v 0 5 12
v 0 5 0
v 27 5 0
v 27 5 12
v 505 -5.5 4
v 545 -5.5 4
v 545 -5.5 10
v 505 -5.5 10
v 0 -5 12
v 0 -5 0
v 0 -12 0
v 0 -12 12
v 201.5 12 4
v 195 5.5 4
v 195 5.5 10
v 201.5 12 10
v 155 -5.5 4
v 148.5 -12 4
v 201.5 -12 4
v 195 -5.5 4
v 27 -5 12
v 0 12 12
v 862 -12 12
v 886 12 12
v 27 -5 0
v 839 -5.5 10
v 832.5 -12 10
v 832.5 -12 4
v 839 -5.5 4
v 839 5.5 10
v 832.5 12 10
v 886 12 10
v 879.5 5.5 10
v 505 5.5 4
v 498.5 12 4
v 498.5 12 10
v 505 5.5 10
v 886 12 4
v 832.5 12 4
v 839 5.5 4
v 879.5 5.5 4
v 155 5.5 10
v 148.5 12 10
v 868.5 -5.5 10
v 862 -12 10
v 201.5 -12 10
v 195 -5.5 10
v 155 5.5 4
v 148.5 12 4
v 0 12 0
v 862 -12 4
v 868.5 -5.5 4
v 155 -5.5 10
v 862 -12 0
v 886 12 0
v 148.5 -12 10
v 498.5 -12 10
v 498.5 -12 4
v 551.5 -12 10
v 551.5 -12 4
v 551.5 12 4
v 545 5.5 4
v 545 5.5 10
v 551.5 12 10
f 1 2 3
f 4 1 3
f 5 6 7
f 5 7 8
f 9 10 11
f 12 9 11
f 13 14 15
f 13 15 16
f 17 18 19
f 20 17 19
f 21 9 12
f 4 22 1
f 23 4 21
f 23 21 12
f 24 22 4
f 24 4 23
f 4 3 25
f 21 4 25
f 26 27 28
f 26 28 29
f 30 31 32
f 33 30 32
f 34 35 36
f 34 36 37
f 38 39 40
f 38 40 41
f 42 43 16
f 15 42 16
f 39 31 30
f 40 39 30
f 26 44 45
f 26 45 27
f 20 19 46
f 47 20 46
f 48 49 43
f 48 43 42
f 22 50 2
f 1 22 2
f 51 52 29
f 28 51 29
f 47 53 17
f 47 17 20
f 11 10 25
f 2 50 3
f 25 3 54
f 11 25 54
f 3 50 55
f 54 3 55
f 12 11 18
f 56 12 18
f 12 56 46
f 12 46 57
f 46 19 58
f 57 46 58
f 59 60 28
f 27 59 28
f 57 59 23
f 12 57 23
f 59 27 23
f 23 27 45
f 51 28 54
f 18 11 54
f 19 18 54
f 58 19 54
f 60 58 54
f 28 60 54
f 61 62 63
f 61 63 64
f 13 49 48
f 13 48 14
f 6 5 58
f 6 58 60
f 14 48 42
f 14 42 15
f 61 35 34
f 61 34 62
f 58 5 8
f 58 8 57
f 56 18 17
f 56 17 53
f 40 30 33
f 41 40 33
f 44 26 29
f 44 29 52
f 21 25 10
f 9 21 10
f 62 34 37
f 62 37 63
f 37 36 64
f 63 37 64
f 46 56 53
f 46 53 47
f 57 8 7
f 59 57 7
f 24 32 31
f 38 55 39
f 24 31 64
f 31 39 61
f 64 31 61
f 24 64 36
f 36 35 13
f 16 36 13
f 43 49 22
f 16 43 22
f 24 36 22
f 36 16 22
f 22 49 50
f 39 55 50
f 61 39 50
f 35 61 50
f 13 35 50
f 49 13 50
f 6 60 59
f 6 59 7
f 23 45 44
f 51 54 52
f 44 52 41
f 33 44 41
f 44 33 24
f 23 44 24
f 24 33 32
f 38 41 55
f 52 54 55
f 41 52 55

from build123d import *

# Parameters (mm, degrees)
EXTRUDE_1_DEPTH        = 12
SKETCH_2_W             = 40
SKETCH_2_H             = 6
CUT_EXTRUDE_1_DEPTH    = 6.5
DRAFT_1_ANGLE          = 45
DRAFT_2_ANGLE          = 45
PATTERN_START          = 4
PATTERN_LINEAR_1_DEPTH = 6
MIRROR_START           = 4
MIRROR_2_DEPTH         = 6
CUT_EXTRUDE_START      = -2
CUT_EXTRUDE_2_DEPTH    = 6


# Read off the part's stored shape, not the designer's step: 阵列(线性)1, 镜向2
with BuildPart() as part:
    # 草图1 → 凸台-拉伸1 (new body)
    with BuildSketch(Plane.XY):
        Polygon((0, 12), (0, 5), (27, 5), (27, -5), (0, -5), (0, -12), (862, -12), (886, 12), align=None)
    extrude(amount=EXTRUDE_1_DEPTH)

    # 草图2 → 切除-拉伸1 (cut)
    with BuildSketch(Plane.XZ.offset(12)):
        with Locations((175, 7)):
            Rectangle(SKETCH_2_W, SKETCH_2_H)
    extrude(amount=-CUT_EXTRUDE_1_DEPTH, mode=Mode.SUBTRACT)

    # 拔模1
    draft_1_faces = [part.faces().sort_by_distance(p)[0] for p in [
        (155, -8.75, 7),
    ]]
    draft(draft_1_faces, Plane(origin=(0, -5.5, 0), x_dir=(0, 0, -1), z_dir=(0, -1, 0)), DRAFT_1_ANGLE)

    # 拔模2
    draft_2_faces = [part.faces().sort_by_distance(p)[0] for p in [
        (195, -8.75, 7),
    ]]
    draft(draft_2_faces, Plane(origin=(0, -5.5, 0), x_dir=(0, 0, -1), z_dir=(0, -1, 0)), DRAFT_2_ANGLE)

    # 阵列(线性)1 outline → 阵列(线性)1 (cut)
    with BuildSketch(Plane.XY.offset(PATTERN_START)):
        Polygon((551.5, -12), (545, -5.5), (505, -5.5), (498.5, -12), align=None)
    extrude(amount=PATTERN_LINEAR_1_DEPTH, mode=Mode.SUBTRACT)

    # 镜向2 outline → 镜向2 (cut)
    with BuildSketch(Plane.XY.offset(MIRROR_START)):
        Polygon((195, 5.5), (201.5, 12), (148.5, 12), (155, 5.5), align=None)
        Polygon((545, 5.5), (551.5, 12), (498.5, 12), (505, 5.5), align=None)
    extrude(amount=MIRROR_2_DEPTH, mode=Mode.SUBTRACT)

    # 草图4 → 切除-拉伸2 (cut)
    with BuildSketch(Plane.XY.offset(12).offset(CUT_EXTRUDE_START)):
        Polygon((832.5, 12), (839, 5.5), (879.5, 5.5), (886, 12), align=None)
        Polygon((832.5, -12), (839, -5.5), (868.5, -5.5), (862, -12), align=None)
    extrude(amount=-CUT_EXTRUDE_2_DEPTH, mode=Mode.SUBTRACT)


solid = part.part
